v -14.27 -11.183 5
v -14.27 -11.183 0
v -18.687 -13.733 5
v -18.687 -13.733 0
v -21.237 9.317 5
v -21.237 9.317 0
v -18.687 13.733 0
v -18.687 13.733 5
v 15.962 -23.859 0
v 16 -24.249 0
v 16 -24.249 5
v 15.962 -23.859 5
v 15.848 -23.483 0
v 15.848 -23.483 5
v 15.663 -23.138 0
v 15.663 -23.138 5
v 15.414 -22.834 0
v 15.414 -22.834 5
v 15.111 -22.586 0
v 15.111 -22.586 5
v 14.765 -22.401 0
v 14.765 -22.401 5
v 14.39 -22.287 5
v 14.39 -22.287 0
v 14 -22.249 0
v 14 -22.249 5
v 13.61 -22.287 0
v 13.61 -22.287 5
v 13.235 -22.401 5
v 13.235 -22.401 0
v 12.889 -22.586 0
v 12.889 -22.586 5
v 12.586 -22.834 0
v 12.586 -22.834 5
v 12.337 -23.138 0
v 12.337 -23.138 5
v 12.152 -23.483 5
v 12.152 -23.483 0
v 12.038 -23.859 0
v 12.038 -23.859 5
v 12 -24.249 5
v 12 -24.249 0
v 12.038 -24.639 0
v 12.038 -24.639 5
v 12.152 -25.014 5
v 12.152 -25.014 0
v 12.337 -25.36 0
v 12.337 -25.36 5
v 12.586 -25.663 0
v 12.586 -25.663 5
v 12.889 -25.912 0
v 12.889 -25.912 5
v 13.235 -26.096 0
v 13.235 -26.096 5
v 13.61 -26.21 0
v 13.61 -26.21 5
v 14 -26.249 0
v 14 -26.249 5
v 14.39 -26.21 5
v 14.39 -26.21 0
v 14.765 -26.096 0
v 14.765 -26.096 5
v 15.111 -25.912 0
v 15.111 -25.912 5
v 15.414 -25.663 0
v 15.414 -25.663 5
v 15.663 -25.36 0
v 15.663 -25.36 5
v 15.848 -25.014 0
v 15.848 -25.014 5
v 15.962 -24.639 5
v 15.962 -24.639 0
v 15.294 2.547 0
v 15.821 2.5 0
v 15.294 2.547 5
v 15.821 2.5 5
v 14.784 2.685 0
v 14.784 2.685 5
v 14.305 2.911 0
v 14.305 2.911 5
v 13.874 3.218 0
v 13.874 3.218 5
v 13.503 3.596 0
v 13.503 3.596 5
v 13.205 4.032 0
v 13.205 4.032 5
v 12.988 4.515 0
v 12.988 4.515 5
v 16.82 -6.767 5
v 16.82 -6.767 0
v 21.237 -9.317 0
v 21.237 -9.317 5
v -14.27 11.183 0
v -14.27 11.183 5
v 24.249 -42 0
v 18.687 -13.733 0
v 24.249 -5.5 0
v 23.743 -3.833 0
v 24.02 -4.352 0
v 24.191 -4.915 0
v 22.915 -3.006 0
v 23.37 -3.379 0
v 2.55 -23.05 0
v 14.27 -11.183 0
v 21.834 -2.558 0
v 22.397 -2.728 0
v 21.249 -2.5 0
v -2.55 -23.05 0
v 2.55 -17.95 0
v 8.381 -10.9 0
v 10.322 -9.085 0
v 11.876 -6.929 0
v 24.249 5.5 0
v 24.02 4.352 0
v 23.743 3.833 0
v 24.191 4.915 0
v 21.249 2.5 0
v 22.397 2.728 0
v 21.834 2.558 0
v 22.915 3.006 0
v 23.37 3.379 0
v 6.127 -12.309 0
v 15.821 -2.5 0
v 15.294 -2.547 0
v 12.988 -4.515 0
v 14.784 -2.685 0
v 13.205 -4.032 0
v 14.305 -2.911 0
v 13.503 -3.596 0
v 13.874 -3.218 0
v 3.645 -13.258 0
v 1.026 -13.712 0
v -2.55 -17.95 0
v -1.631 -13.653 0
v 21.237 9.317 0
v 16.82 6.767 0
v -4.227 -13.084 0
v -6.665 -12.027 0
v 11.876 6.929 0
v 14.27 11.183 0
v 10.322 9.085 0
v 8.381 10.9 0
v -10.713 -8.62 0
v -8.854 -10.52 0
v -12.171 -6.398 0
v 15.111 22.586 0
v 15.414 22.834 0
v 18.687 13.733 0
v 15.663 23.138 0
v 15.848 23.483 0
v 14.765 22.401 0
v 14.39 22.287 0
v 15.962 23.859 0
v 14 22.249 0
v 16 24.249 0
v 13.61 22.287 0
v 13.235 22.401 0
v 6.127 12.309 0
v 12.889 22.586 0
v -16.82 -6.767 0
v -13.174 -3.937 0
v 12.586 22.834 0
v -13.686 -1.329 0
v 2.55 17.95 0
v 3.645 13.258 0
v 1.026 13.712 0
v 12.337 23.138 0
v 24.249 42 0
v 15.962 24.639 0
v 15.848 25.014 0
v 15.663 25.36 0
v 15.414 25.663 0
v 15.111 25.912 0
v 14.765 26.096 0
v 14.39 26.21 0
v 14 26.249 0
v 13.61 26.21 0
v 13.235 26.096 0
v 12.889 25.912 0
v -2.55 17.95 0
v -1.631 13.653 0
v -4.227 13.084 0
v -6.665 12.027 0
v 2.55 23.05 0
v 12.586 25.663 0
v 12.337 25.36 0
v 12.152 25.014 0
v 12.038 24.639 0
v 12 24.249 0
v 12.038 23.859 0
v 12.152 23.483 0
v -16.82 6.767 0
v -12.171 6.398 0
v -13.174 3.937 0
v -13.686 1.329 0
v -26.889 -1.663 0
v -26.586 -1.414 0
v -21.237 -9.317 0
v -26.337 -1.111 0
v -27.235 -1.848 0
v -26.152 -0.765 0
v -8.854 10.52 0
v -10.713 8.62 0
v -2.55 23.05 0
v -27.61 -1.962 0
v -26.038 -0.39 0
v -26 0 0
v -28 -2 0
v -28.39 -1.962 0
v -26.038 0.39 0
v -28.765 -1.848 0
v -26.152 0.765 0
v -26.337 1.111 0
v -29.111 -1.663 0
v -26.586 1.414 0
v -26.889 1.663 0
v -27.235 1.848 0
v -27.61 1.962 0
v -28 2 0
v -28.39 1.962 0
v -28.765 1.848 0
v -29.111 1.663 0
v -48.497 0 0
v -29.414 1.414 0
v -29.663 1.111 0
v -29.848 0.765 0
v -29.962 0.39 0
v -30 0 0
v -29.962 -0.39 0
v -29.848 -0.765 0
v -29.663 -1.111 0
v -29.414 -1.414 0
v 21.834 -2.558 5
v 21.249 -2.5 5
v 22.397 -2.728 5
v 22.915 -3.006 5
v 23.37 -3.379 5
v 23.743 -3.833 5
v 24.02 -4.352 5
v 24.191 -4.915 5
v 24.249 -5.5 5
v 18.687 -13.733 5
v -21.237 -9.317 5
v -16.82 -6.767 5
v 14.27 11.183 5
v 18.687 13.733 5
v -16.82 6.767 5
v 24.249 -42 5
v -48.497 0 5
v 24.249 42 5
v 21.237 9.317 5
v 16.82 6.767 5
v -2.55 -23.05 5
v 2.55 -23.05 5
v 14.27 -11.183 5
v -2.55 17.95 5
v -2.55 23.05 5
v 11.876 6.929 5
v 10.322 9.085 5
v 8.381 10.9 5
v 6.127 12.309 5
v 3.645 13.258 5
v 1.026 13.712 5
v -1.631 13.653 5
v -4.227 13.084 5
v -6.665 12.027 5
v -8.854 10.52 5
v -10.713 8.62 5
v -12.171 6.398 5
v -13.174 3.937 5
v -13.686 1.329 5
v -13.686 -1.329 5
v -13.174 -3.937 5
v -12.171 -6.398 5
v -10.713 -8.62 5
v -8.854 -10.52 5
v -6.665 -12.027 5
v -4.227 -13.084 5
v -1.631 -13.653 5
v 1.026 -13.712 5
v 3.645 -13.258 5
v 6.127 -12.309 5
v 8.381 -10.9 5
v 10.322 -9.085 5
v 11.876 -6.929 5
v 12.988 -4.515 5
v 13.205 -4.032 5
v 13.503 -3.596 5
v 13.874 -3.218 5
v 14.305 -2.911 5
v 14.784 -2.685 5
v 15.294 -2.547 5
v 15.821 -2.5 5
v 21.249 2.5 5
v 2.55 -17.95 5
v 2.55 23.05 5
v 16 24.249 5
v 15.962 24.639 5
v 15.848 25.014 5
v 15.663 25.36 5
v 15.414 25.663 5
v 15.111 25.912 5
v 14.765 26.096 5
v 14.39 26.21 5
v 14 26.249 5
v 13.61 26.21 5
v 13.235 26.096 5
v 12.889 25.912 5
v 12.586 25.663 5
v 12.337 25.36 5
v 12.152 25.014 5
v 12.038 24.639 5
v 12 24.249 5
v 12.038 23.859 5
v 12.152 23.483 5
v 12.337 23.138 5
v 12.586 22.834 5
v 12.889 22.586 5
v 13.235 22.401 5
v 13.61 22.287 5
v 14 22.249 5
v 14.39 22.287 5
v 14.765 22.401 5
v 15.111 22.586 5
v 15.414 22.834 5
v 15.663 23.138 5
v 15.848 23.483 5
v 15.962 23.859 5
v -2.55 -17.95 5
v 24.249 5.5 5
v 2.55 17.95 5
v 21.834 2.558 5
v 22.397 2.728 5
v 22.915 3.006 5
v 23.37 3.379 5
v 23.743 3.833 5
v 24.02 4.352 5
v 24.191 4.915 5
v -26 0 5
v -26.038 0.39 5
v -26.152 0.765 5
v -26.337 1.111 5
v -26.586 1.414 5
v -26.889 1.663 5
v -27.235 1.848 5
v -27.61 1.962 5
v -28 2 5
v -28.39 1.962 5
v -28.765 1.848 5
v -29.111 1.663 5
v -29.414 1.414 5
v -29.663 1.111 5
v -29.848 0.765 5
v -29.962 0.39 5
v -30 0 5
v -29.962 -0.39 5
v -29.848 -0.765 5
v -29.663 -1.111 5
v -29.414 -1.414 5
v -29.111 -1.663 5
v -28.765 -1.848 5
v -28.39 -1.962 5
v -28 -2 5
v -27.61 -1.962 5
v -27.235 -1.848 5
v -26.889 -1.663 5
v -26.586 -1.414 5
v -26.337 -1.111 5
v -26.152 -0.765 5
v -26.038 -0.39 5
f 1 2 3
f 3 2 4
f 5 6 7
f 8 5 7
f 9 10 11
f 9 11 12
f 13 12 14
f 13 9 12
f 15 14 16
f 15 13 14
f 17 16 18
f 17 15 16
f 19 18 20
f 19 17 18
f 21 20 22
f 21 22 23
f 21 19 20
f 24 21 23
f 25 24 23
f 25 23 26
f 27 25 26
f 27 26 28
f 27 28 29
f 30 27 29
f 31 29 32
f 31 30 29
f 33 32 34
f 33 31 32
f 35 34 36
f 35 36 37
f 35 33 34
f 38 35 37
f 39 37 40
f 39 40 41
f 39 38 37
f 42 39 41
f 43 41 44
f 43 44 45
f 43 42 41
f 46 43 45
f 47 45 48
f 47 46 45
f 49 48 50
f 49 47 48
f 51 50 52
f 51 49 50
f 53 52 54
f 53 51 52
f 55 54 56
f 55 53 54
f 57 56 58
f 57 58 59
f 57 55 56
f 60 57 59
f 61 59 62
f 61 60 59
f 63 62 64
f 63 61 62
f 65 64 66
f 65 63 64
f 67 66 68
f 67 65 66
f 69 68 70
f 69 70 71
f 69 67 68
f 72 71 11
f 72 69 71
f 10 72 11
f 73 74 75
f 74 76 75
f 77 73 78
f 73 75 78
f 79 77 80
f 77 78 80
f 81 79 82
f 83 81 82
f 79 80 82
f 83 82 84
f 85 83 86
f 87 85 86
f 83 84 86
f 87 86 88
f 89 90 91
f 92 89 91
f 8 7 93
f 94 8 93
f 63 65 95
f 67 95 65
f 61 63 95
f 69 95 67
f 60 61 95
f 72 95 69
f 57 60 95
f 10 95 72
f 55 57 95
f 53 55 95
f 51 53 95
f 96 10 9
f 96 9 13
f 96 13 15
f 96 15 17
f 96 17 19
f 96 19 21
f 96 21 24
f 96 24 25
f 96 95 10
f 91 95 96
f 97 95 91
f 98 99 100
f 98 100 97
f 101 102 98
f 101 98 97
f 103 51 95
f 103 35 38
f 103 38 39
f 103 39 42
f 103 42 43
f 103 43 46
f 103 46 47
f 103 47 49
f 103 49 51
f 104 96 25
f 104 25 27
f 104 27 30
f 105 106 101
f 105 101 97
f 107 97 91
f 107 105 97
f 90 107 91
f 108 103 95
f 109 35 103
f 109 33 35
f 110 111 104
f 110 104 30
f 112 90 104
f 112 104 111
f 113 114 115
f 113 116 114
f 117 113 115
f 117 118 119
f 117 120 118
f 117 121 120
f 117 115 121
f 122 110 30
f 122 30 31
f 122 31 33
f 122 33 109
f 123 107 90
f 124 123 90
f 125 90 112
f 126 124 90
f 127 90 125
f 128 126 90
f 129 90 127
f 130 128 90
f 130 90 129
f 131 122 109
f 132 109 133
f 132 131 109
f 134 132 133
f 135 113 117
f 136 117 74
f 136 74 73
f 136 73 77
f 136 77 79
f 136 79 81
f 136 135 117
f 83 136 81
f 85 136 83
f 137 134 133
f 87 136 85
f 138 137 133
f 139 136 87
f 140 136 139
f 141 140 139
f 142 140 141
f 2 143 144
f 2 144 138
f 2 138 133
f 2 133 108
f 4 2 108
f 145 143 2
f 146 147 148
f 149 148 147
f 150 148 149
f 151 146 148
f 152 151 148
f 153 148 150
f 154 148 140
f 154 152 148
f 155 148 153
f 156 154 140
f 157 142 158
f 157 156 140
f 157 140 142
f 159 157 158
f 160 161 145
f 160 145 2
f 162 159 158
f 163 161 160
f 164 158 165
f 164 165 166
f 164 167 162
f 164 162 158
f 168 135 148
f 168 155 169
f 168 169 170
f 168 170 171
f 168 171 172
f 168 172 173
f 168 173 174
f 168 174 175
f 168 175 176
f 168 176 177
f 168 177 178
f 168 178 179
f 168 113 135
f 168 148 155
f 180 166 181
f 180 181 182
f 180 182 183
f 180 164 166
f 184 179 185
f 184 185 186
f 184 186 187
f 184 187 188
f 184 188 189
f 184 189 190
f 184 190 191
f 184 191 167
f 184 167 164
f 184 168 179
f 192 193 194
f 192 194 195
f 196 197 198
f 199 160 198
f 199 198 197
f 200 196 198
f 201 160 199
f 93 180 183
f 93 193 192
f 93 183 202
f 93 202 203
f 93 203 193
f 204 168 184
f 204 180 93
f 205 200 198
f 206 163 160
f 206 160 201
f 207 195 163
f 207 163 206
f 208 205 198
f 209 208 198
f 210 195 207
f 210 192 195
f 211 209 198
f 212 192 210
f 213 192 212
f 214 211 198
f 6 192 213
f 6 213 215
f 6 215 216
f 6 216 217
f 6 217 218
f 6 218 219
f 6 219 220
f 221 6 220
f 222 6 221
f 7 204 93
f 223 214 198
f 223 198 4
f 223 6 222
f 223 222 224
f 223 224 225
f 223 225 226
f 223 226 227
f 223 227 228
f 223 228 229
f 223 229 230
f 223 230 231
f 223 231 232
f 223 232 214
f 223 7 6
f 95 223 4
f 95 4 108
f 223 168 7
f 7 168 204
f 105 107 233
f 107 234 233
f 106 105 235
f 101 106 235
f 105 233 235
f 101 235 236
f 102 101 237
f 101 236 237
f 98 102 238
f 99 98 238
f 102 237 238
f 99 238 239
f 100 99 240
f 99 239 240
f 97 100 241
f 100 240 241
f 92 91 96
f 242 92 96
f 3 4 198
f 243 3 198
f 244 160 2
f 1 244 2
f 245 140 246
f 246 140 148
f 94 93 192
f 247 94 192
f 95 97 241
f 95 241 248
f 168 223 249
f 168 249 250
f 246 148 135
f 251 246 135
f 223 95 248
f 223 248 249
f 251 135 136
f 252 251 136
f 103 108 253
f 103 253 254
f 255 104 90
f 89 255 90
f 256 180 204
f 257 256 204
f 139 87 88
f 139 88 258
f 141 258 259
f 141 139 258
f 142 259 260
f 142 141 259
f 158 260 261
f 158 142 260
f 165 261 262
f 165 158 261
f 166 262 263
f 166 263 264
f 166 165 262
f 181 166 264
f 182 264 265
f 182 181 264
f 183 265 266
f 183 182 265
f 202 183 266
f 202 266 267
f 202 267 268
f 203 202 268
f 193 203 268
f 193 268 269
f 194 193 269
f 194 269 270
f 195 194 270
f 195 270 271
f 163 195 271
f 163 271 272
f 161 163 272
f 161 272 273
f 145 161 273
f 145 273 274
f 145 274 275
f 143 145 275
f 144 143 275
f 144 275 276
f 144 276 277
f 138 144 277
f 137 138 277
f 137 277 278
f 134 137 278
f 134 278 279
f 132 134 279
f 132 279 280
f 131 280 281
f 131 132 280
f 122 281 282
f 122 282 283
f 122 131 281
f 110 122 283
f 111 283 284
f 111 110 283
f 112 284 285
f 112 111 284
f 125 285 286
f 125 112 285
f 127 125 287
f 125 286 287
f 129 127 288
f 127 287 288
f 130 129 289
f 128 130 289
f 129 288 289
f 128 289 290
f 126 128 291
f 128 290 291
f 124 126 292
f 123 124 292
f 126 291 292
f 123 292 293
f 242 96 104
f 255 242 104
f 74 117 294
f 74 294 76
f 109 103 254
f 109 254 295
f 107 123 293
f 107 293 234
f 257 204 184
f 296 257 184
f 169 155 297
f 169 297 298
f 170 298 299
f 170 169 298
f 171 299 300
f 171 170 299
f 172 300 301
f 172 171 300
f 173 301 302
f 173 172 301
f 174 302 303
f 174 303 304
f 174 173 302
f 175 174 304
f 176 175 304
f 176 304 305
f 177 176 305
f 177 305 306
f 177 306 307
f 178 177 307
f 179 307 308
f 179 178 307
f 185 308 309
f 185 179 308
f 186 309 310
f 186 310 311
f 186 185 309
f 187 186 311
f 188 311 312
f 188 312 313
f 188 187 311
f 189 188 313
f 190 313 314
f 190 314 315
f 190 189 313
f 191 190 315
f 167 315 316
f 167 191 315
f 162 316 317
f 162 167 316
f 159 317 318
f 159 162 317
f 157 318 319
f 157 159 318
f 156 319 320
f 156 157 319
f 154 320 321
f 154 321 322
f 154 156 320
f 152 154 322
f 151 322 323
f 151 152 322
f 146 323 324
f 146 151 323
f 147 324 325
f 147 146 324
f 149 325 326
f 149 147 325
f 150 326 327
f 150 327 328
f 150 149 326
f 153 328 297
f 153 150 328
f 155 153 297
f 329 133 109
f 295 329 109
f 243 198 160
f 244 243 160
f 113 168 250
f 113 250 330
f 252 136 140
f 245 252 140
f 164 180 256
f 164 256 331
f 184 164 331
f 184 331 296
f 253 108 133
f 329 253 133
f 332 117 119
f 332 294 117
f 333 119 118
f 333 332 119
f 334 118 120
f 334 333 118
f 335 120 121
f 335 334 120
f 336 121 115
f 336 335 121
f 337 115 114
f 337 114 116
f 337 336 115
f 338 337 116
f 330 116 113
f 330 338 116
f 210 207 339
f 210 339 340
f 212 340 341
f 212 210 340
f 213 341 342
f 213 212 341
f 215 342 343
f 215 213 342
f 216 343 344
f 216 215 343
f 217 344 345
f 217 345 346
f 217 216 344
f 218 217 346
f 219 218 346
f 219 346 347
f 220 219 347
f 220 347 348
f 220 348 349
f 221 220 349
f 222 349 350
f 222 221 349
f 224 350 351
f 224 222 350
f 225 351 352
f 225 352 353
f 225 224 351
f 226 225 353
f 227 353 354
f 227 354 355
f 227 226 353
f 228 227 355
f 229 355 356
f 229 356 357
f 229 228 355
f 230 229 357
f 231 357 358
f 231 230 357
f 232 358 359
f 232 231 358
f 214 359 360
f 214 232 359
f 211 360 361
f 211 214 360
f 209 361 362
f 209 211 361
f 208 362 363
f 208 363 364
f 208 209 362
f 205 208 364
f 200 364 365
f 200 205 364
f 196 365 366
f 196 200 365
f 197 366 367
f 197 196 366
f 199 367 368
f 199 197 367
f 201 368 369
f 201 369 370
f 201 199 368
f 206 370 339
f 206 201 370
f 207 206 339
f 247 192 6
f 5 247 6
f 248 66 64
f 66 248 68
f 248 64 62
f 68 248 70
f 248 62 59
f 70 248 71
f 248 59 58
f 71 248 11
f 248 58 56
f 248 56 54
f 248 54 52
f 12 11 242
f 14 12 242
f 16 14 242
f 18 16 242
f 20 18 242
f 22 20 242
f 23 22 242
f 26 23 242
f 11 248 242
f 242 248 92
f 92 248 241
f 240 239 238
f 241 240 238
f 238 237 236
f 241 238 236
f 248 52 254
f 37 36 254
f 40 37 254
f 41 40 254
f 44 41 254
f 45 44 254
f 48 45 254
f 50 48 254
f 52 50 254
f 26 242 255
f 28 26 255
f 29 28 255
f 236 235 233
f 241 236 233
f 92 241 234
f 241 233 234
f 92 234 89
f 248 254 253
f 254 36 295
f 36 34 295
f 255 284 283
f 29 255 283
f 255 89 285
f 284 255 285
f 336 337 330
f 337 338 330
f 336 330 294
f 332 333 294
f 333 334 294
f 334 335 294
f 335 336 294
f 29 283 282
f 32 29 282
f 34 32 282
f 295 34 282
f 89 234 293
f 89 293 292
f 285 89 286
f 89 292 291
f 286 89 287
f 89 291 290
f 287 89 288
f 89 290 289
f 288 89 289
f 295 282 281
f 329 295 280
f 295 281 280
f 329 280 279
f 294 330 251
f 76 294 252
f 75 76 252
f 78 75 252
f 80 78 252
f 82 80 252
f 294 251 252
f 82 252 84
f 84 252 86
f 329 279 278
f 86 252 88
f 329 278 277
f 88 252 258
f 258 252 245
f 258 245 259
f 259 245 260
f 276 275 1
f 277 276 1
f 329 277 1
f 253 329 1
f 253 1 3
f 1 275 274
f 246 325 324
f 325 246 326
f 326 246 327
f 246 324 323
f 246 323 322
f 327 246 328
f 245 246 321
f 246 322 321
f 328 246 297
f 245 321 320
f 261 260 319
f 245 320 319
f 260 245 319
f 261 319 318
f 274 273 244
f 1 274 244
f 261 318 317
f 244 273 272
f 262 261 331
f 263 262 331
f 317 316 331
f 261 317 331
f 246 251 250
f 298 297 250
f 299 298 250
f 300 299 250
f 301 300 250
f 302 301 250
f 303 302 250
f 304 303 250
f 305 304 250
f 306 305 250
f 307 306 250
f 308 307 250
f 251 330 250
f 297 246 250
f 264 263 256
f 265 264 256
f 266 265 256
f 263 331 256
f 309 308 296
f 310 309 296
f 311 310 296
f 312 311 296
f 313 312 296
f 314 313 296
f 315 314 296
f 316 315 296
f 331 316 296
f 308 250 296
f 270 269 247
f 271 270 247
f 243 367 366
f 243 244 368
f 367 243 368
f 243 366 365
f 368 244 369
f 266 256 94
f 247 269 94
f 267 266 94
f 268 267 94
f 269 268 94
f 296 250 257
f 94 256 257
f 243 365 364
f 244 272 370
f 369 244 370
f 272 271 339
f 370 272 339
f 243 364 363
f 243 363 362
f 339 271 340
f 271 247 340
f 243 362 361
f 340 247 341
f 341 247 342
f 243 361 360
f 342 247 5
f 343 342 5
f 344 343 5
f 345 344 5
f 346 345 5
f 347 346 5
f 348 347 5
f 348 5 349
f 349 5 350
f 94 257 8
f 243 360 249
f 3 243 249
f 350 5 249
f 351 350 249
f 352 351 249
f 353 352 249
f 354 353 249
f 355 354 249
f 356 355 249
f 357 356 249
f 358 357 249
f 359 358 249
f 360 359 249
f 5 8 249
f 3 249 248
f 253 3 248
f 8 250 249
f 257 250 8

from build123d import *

# Parameters (mm, degrees)
SKETCH1_R           = 2
SKETCH1_W           = 5.1
SKETCH1_H           = 5.1
BOSS_EXTRUDE1_DEPTH = 5
CONG_2_R            = 3


with BuildPart() as part:
    # Sketch1 → Boss-Extrude1 (new body)
    with BuildSketch(Plane.XY):
        with BuildLine():
            Line((24.248711306, 2.5), (13.520817283, 2.5))
            ThreePointArc((13.520817283, 2.5), (-13.75, 0), (13.520817283, -2.5))
            Line((13.520817283, -2.5), (24.248711306, -2.5))
            Line((24.248711306, -2.5), (24.248711306, -42))
            Line((24.248711306, -42), (-48.497422612, 0))
            Line((-48.497422612, 0), (24.248711306, 42))
            Line((24.248711306, 42), (24.248711306, 2.5))
        make_face()
        with Locations((14, 24.248711306)):
            Circle(SKETCH1_R, mode=Mode.SUBTRACT)
        with Locations((14, -24.248711306)):
            Circle(SKETCH1_R, mode=Mode.SUBTRACT)
        with Locations((-28, 0)):
            Circle(SKETCH1_R, mode=Mode.SUBTRACT)
        with Locations((0, 20.5)):
            Rectangle(SKETCH1_W, SKETCH1_H, mode=Mode.SUBTRACT)
        Polygon((21.236885557, 9.31663522), (16.820155998, 6.76663522), (14.270155998, 11.18336478), (18.686885557, 13.73336478), align=None, mode=Mode.SUBTRACT)
        Polygon((18.686885557, -13.73336478), (14.270155998, -11.18336478), (16.820155998, -6.76663522), (21.236885557, -9.31663522), align=None, mode=Mode.SUBTRACT)
        with Locations((0, -20.5)):
            Rectangle(SKETCH1_W, SKETCH1_H, mode=Mode.SUBTRACT)
        Polygon((-21.236885557, -9.31663522), (-16.820155998, -6.76663522), (-14.270155998, -11.18336478), (-18.686885557, -13.73336478), align=None, mode=Mode.SUBTRACT)
        Polygon((-18.686885557, 13.73336478), (-14.270155998, 11.18336478), (-16.820155998, 6.76663522), (-21.236885557, 9.31663522), align=None, mode=Mode.SUBTRACT)
    extrude(amount=BOSS_EXTRUDE1_DEPTH)

    # Congé2
    cong_2_edges = [part.edges().sort_by_distance(p)[0] for p in [
        (24.248711306, 2.5, 2.5),
        (13.520817283, 2.5, 2.5),
        (13.520817283, -2.5, 2.5),
        (24.248711306, -2.5, 2.5),
    ]]
    fillet(cong_2_edges, radius=CONG_2_R)


solid = part.part
